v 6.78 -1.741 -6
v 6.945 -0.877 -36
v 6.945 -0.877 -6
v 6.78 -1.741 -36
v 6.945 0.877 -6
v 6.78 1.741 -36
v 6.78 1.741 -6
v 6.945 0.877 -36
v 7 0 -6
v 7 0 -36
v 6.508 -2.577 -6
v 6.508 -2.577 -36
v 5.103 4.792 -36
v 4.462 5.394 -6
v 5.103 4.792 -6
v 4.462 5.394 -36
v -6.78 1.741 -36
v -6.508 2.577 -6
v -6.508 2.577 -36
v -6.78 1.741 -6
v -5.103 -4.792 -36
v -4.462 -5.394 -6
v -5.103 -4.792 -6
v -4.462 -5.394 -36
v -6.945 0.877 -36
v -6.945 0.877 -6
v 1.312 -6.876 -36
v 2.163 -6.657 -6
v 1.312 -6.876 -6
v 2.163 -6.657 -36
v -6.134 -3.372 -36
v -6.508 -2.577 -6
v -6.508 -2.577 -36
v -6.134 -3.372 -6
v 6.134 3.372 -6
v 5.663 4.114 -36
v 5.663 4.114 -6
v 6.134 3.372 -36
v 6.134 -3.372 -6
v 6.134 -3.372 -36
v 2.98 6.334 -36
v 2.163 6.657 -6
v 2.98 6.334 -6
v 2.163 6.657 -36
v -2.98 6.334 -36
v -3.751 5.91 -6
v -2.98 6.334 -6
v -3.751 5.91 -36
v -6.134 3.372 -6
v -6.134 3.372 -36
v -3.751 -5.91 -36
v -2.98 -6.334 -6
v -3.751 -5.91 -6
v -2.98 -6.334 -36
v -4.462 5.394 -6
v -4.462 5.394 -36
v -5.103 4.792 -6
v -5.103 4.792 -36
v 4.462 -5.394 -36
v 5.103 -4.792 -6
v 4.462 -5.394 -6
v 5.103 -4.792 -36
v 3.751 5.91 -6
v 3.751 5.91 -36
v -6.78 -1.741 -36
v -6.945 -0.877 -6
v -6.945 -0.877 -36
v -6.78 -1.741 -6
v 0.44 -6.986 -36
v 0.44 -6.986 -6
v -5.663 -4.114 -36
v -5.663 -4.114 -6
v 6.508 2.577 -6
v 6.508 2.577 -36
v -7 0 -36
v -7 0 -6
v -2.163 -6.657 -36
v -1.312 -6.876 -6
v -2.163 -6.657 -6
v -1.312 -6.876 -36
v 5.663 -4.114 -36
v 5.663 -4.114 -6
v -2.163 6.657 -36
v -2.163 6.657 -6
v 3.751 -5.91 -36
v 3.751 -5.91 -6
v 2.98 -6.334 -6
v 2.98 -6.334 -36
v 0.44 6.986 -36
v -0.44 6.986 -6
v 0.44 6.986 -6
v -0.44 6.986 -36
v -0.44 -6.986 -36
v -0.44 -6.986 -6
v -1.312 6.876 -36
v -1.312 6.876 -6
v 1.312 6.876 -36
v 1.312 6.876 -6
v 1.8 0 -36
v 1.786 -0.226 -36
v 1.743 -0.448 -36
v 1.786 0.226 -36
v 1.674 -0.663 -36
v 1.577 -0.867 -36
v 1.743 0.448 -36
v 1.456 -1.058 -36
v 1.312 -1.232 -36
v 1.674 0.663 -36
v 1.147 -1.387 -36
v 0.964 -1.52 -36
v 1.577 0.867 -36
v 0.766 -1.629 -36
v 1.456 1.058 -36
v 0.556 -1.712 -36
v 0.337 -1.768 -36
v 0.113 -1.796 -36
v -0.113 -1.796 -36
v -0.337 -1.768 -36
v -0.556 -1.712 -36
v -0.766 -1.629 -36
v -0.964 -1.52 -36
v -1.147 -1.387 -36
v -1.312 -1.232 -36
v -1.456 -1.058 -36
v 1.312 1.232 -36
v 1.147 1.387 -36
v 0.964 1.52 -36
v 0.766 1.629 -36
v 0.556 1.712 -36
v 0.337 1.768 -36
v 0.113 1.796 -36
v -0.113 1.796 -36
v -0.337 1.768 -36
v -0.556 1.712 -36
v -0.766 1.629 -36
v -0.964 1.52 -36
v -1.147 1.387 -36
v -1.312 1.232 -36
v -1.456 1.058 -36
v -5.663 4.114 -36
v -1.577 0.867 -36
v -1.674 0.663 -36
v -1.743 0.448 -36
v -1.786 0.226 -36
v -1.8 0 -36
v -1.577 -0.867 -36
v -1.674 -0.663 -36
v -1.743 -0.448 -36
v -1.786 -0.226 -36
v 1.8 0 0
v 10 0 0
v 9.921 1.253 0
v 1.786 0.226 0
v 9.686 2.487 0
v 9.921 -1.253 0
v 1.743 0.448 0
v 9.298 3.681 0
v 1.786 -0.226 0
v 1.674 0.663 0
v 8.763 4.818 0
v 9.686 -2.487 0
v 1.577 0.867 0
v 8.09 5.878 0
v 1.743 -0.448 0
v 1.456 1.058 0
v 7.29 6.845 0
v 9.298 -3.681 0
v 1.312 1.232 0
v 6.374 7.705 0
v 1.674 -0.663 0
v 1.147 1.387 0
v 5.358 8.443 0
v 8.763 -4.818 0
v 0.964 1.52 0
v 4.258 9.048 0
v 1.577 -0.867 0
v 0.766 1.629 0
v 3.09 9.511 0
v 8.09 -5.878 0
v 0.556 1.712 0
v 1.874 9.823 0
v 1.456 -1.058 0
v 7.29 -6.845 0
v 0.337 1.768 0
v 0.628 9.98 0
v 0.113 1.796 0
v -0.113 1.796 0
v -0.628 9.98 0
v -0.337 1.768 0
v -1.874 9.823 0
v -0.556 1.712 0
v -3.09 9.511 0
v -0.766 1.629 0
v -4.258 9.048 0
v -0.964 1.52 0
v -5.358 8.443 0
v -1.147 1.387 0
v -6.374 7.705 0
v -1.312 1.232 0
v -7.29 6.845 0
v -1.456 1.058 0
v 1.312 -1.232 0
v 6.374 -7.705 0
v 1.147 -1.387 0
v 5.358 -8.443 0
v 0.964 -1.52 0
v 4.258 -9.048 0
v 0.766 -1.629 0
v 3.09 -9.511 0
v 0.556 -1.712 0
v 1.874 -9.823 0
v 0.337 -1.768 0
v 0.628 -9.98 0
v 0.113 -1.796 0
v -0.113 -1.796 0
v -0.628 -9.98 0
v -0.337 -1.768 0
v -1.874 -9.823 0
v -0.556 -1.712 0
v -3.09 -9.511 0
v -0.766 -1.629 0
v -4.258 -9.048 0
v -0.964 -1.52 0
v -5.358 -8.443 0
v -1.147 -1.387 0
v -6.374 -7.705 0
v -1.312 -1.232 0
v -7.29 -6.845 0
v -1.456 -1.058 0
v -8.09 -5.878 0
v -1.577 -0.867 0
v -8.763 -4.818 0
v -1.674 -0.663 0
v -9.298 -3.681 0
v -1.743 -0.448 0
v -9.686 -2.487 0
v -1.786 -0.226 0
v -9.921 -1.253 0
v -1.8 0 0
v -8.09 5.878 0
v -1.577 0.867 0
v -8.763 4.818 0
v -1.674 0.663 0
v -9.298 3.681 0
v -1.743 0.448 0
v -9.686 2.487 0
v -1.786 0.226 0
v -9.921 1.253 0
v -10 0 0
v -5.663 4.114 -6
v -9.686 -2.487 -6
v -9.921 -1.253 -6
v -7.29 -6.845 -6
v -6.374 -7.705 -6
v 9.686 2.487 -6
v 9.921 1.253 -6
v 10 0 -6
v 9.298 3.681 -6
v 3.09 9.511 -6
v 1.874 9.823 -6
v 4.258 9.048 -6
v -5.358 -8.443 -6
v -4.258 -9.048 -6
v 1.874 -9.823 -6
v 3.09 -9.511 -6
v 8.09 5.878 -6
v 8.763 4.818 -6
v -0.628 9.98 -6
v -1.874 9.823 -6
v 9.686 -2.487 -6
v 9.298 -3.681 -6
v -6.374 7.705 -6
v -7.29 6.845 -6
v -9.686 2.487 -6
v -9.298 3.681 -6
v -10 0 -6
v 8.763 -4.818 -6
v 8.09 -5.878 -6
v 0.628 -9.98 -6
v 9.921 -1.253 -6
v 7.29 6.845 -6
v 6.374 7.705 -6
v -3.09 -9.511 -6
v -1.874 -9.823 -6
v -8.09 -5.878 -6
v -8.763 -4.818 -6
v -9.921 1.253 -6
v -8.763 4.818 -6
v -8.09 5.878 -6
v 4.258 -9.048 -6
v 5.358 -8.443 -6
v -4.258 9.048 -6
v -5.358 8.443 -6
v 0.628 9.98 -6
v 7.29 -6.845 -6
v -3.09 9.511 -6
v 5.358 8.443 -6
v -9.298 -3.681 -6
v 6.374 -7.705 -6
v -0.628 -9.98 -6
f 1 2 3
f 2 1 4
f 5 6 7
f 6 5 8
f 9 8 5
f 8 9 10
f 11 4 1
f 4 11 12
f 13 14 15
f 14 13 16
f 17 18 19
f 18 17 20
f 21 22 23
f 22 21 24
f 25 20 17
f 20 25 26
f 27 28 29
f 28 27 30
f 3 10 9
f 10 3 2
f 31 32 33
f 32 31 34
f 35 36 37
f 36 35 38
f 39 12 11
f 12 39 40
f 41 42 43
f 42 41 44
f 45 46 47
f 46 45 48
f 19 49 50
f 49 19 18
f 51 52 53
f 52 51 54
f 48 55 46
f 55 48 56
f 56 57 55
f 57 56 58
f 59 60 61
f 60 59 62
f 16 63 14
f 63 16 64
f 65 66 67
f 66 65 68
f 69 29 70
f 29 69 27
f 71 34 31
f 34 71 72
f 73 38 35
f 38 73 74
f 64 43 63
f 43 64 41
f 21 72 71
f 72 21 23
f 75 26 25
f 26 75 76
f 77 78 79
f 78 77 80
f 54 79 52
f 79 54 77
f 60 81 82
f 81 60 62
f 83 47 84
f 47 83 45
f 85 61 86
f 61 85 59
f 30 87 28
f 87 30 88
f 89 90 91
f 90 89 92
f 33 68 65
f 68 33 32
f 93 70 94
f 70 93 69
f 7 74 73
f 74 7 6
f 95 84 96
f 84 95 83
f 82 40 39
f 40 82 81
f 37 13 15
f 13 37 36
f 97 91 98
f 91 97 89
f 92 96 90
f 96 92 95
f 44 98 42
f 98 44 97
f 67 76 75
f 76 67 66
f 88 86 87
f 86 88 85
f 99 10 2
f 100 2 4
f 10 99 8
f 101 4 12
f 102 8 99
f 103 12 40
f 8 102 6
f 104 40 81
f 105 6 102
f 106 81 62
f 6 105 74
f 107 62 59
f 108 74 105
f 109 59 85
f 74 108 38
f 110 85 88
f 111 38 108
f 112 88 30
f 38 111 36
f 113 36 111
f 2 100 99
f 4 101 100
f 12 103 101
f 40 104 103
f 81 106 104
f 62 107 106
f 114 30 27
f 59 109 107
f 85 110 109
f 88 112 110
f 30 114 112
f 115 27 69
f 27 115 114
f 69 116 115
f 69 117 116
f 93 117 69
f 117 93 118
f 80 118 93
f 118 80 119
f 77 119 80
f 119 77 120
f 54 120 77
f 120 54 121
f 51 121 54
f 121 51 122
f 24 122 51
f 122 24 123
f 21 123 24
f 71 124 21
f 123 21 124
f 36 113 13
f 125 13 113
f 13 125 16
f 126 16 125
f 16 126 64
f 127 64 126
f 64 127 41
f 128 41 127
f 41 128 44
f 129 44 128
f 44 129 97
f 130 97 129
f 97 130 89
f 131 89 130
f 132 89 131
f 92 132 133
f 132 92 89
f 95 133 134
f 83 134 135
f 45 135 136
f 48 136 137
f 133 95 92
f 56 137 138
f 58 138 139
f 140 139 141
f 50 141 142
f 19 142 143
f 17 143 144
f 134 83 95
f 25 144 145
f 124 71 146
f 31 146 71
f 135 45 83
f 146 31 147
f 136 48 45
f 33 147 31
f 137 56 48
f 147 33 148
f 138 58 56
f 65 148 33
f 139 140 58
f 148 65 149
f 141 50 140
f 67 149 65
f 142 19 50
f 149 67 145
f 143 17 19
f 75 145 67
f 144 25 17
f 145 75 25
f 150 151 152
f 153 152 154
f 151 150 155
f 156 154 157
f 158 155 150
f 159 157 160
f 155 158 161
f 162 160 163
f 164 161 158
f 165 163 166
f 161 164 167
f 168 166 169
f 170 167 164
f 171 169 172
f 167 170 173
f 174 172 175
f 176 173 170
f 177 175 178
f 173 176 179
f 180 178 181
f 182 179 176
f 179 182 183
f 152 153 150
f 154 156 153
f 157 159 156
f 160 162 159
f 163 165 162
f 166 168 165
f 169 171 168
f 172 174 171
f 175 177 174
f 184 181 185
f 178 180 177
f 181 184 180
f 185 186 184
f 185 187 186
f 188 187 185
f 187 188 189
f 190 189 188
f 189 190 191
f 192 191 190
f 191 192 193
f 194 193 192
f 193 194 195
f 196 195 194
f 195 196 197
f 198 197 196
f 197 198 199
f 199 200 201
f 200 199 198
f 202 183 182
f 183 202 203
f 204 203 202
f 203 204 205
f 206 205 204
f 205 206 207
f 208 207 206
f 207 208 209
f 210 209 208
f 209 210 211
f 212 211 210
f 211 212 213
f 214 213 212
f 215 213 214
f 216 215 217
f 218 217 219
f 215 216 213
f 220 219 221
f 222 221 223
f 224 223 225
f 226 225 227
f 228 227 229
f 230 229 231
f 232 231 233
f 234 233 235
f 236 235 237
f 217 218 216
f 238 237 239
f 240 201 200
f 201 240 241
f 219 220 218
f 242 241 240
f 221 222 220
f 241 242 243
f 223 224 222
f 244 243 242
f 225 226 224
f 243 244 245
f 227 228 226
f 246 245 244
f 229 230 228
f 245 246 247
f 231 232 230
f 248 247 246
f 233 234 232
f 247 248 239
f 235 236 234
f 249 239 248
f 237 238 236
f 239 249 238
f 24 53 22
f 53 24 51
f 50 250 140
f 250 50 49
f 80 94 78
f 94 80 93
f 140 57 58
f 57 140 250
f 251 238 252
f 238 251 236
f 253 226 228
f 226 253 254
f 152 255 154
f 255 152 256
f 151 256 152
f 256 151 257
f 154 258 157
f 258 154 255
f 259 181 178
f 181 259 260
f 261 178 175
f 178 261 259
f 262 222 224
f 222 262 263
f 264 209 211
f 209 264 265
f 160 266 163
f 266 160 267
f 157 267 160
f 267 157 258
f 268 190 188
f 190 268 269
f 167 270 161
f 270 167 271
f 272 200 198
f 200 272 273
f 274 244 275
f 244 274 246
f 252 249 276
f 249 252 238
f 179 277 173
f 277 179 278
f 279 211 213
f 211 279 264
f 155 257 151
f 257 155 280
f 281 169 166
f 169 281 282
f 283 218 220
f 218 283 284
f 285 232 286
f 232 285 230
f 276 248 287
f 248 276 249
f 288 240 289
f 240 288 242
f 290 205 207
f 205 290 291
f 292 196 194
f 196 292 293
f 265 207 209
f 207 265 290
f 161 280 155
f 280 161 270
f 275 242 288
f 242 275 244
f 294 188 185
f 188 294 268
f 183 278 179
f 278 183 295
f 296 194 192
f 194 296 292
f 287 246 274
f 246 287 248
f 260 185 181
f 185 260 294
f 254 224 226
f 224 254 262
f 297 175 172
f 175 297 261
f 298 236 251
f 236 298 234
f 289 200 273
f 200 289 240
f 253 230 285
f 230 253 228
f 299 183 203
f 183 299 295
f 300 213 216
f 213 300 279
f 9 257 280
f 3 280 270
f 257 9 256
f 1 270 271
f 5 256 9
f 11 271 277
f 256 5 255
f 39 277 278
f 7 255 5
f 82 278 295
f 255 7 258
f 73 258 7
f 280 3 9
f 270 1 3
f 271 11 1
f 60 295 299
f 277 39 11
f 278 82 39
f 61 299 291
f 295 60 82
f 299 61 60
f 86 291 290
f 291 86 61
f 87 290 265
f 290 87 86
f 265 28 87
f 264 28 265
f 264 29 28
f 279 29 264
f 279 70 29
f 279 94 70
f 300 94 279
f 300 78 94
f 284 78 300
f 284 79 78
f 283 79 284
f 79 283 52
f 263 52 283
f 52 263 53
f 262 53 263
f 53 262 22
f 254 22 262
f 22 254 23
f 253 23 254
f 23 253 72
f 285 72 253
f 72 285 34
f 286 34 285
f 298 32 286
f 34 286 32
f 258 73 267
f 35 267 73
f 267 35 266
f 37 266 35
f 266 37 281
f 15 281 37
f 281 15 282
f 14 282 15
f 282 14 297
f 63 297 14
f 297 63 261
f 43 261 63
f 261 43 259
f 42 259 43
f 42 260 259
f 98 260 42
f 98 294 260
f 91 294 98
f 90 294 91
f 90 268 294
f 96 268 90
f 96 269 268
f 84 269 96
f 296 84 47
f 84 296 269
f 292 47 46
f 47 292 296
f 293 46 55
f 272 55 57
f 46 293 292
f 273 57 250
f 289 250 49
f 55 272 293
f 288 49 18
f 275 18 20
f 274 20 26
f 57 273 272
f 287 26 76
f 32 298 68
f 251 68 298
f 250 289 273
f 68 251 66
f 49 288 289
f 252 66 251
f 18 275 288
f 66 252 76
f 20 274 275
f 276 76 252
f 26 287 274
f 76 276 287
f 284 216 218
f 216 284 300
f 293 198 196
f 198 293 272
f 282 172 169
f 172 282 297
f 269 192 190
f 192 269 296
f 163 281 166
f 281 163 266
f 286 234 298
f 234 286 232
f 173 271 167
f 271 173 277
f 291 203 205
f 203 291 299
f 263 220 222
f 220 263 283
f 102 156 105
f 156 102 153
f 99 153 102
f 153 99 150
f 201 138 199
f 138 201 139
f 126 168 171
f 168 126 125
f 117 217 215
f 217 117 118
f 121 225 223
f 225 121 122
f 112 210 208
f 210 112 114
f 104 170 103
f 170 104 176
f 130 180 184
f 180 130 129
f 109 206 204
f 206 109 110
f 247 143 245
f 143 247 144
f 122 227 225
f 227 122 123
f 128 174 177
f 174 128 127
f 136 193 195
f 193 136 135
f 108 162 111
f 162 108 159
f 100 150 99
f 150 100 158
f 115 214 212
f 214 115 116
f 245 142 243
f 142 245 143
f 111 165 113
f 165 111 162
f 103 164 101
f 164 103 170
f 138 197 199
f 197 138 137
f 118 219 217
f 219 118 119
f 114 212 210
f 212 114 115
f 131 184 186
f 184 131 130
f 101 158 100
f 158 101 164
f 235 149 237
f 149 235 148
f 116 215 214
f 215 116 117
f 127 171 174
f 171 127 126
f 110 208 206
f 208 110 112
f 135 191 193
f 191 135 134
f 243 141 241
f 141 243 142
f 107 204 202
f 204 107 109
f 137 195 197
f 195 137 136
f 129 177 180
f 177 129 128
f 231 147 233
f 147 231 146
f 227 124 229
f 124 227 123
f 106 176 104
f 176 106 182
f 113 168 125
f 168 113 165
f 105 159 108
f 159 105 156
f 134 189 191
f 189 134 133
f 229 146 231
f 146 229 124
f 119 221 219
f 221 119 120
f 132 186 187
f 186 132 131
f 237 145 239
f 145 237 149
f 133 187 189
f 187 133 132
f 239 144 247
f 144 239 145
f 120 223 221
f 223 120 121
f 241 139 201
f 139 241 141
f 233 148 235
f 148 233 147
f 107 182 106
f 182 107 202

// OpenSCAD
$fn = 50;


difference() {
	union() {
		translate(v = [0, 0, -36.0000000000]) {
			cylinder(h = 36, r = 7.0000000000);
		}
		translate(v = [0, 0, -6.0000000000]) {
			cylinder(h = 6, r = 10.0000000000);
		}
	}
	union() {
		#translate(v = [0, 0, -36]) {
			cylinder(h = 36, r = 1.8000000000);
		}
	}
}
